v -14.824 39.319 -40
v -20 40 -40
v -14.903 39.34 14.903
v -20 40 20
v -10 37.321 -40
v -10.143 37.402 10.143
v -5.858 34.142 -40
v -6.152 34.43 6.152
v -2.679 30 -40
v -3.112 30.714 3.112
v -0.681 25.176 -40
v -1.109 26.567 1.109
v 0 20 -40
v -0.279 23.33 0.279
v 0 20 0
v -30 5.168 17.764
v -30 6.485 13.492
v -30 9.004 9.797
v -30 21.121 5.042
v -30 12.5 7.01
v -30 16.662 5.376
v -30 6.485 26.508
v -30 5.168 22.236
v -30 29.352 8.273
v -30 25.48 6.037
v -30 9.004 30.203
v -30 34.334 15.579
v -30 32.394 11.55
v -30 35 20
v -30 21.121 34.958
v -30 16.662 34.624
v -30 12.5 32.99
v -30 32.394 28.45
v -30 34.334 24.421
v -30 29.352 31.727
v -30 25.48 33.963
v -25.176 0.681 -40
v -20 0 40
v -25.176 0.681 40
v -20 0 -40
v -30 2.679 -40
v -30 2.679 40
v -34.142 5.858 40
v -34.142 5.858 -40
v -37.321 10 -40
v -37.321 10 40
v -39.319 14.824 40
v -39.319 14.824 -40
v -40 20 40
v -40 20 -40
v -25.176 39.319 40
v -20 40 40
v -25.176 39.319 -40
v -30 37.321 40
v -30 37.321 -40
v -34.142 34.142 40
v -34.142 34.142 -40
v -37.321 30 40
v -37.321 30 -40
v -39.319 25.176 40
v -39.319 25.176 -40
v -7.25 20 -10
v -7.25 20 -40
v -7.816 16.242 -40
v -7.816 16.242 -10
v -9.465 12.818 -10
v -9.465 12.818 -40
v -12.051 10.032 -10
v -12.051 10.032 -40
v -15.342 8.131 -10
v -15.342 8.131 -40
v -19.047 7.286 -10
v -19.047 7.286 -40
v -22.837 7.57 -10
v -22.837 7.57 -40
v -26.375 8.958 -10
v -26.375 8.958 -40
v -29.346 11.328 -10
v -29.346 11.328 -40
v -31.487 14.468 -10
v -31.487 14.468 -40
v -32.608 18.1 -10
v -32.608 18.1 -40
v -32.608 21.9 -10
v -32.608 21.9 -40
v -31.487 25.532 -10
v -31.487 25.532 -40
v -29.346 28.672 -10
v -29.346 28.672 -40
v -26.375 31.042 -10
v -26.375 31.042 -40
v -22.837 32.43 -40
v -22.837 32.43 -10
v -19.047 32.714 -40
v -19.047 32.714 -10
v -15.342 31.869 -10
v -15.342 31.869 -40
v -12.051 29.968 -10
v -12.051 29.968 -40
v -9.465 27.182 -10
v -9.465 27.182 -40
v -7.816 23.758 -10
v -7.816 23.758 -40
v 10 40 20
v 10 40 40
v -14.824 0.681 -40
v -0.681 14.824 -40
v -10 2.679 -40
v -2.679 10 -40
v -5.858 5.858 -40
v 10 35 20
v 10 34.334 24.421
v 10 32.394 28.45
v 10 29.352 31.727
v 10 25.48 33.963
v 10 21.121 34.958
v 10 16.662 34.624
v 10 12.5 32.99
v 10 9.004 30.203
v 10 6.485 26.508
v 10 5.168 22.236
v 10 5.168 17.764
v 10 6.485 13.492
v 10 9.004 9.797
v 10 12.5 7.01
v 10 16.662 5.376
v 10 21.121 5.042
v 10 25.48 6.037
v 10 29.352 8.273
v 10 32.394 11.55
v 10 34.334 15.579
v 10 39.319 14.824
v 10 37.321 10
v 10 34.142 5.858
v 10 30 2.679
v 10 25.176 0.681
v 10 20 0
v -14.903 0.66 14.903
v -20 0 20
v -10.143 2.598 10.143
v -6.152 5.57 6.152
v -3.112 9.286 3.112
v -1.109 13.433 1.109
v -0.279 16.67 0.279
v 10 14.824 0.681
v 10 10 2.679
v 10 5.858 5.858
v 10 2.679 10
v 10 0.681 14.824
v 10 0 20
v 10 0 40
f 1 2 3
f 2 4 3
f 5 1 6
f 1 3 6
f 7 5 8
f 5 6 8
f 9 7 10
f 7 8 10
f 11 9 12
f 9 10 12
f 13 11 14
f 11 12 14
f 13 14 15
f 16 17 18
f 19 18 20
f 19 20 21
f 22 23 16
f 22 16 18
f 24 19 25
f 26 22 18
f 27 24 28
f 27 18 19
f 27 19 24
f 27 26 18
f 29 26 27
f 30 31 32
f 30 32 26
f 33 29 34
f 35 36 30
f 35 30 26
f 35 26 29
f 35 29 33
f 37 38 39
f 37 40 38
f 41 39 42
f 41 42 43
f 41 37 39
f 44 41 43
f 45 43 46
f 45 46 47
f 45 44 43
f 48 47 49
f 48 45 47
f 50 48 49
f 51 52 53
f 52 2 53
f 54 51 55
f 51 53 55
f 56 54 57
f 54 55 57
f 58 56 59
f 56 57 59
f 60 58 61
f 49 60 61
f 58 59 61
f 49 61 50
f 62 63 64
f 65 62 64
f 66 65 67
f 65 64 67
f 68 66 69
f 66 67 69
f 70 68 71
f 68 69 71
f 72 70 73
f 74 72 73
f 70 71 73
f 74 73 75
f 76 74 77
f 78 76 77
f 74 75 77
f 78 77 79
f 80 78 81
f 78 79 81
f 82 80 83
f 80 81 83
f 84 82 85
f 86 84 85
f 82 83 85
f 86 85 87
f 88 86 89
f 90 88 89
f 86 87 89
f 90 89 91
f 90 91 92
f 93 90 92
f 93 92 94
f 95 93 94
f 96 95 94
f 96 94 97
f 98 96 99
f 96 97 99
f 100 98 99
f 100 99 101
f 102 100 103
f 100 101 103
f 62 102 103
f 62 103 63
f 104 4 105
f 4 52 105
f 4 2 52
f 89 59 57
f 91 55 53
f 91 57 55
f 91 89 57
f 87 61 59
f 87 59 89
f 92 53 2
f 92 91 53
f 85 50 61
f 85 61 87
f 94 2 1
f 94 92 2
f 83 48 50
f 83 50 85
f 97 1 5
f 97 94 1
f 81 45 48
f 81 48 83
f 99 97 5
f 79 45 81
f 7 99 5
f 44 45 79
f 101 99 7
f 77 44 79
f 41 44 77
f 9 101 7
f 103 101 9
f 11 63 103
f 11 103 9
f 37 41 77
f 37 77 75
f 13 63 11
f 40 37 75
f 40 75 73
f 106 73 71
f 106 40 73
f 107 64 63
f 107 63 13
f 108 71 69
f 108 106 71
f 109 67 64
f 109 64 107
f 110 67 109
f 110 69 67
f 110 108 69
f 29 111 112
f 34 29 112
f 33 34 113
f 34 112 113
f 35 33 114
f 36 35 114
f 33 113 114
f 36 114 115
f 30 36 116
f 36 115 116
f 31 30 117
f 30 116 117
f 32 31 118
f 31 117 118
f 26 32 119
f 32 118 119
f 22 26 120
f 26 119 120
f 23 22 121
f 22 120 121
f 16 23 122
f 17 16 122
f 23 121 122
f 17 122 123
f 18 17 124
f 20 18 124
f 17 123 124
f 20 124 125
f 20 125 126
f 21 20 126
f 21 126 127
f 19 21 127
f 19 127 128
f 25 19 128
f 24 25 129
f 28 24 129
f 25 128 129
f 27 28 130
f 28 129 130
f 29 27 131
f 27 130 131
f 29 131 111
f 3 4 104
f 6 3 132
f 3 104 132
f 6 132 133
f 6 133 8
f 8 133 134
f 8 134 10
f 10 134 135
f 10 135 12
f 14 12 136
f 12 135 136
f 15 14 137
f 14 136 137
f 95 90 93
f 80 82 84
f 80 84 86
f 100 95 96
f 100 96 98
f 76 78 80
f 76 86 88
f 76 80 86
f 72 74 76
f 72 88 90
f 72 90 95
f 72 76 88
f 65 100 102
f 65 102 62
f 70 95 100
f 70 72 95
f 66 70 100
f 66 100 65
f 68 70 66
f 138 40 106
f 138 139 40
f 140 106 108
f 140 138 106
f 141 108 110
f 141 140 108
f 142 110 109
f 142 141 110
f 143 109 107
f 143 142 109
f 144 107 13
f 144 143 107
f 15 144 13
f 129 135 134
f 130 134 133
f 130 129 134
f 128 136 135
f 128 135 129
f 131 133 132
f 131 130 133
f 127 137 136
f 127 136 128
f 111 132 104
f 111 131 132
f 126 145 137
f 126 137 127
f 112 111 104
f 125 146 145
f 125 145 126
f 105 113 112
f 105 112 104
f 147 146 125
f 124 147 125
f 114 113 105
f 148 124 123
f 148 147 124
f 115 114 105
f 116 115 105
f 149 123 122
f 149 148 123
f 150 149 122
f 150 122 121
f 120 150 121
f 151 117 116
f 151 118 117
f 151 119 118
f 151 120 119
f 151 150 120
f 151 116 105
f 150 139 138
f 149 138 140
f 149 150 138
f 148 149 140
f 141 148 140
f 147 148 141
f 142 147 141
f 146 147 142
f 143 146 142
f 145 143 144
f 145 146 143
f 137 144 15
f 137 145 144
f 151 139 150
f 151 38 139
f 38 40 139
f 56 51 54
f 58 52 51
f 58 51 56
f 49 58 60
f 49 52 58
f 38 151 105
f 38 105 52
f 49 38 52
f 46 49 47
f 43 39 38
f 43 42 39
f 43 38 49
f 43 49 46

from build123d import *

# Parameters (mm, degrees)
F1_DEPTH = 40
F2_R     = 15
F3_DEPTH = 40
F4_R     = 12.75
F5_DEPTH = 30
F6_R     = 19.99999
F7_R     = 19.99999


# Not quite as in the source:
# - a fillet or chamfer is up to 0.001 mm smaller than in the source, because OpenCascade refuses the exact size


with BuildPart() as f1:
    # F0 (on Front) → F1 (new body)
    with BuildSketch(Plane.XZ):
        Polygon((0, -40), (0, 0), (10, 0), (10, 40), (-40, 40), (-40, -40), align=None)
    extrude(amount=-F1_DEPTH)

    # F2 (on face) → F3 (cut)
    with BuildSketch(Plane.YZ.offset(10)):
        with Locations((20, 20)):
            Circle(F2_R)
    extrude(amount=-F3_DEPTH, mode=Mode.SUBTRACT)

    # F4 (on face) → F5 (cut)
    with BuildSketch(Plane(origin=(0, 0, -40), x_dir=(1, 0, 0), z_dir=(0, 0, -1))):
        with Locations((-20, -20)):
            Circle(F4_R)
    extrude(amount=-F5_DEPTH, mode=Mode.SUBTRACT)

    # F6 (radius 20 in the source; OpenCascade refuses exactly that, so slightly less here)
    f6_edges = [f1.edges().sort_by_distance(p)[0] for p in [
        (-40, 40, 0),
        (-40, 0, 0),
    ]]
    fillet(f6_edges, radius=F6_R)

    # F7 (radius 20 in the source; OpenCascade refuses exactly that, so slightly less here)
    f7_edges = [f1.edges().sort_by_distance(p)[0] for p in [
        (0, 0, -20),
        (0, 40, -20),
        (5, 0, 0),
        (5, 40, 0),
    ]]
    fillet(f7_edges, radius=F7_R)


solid = f1.part
